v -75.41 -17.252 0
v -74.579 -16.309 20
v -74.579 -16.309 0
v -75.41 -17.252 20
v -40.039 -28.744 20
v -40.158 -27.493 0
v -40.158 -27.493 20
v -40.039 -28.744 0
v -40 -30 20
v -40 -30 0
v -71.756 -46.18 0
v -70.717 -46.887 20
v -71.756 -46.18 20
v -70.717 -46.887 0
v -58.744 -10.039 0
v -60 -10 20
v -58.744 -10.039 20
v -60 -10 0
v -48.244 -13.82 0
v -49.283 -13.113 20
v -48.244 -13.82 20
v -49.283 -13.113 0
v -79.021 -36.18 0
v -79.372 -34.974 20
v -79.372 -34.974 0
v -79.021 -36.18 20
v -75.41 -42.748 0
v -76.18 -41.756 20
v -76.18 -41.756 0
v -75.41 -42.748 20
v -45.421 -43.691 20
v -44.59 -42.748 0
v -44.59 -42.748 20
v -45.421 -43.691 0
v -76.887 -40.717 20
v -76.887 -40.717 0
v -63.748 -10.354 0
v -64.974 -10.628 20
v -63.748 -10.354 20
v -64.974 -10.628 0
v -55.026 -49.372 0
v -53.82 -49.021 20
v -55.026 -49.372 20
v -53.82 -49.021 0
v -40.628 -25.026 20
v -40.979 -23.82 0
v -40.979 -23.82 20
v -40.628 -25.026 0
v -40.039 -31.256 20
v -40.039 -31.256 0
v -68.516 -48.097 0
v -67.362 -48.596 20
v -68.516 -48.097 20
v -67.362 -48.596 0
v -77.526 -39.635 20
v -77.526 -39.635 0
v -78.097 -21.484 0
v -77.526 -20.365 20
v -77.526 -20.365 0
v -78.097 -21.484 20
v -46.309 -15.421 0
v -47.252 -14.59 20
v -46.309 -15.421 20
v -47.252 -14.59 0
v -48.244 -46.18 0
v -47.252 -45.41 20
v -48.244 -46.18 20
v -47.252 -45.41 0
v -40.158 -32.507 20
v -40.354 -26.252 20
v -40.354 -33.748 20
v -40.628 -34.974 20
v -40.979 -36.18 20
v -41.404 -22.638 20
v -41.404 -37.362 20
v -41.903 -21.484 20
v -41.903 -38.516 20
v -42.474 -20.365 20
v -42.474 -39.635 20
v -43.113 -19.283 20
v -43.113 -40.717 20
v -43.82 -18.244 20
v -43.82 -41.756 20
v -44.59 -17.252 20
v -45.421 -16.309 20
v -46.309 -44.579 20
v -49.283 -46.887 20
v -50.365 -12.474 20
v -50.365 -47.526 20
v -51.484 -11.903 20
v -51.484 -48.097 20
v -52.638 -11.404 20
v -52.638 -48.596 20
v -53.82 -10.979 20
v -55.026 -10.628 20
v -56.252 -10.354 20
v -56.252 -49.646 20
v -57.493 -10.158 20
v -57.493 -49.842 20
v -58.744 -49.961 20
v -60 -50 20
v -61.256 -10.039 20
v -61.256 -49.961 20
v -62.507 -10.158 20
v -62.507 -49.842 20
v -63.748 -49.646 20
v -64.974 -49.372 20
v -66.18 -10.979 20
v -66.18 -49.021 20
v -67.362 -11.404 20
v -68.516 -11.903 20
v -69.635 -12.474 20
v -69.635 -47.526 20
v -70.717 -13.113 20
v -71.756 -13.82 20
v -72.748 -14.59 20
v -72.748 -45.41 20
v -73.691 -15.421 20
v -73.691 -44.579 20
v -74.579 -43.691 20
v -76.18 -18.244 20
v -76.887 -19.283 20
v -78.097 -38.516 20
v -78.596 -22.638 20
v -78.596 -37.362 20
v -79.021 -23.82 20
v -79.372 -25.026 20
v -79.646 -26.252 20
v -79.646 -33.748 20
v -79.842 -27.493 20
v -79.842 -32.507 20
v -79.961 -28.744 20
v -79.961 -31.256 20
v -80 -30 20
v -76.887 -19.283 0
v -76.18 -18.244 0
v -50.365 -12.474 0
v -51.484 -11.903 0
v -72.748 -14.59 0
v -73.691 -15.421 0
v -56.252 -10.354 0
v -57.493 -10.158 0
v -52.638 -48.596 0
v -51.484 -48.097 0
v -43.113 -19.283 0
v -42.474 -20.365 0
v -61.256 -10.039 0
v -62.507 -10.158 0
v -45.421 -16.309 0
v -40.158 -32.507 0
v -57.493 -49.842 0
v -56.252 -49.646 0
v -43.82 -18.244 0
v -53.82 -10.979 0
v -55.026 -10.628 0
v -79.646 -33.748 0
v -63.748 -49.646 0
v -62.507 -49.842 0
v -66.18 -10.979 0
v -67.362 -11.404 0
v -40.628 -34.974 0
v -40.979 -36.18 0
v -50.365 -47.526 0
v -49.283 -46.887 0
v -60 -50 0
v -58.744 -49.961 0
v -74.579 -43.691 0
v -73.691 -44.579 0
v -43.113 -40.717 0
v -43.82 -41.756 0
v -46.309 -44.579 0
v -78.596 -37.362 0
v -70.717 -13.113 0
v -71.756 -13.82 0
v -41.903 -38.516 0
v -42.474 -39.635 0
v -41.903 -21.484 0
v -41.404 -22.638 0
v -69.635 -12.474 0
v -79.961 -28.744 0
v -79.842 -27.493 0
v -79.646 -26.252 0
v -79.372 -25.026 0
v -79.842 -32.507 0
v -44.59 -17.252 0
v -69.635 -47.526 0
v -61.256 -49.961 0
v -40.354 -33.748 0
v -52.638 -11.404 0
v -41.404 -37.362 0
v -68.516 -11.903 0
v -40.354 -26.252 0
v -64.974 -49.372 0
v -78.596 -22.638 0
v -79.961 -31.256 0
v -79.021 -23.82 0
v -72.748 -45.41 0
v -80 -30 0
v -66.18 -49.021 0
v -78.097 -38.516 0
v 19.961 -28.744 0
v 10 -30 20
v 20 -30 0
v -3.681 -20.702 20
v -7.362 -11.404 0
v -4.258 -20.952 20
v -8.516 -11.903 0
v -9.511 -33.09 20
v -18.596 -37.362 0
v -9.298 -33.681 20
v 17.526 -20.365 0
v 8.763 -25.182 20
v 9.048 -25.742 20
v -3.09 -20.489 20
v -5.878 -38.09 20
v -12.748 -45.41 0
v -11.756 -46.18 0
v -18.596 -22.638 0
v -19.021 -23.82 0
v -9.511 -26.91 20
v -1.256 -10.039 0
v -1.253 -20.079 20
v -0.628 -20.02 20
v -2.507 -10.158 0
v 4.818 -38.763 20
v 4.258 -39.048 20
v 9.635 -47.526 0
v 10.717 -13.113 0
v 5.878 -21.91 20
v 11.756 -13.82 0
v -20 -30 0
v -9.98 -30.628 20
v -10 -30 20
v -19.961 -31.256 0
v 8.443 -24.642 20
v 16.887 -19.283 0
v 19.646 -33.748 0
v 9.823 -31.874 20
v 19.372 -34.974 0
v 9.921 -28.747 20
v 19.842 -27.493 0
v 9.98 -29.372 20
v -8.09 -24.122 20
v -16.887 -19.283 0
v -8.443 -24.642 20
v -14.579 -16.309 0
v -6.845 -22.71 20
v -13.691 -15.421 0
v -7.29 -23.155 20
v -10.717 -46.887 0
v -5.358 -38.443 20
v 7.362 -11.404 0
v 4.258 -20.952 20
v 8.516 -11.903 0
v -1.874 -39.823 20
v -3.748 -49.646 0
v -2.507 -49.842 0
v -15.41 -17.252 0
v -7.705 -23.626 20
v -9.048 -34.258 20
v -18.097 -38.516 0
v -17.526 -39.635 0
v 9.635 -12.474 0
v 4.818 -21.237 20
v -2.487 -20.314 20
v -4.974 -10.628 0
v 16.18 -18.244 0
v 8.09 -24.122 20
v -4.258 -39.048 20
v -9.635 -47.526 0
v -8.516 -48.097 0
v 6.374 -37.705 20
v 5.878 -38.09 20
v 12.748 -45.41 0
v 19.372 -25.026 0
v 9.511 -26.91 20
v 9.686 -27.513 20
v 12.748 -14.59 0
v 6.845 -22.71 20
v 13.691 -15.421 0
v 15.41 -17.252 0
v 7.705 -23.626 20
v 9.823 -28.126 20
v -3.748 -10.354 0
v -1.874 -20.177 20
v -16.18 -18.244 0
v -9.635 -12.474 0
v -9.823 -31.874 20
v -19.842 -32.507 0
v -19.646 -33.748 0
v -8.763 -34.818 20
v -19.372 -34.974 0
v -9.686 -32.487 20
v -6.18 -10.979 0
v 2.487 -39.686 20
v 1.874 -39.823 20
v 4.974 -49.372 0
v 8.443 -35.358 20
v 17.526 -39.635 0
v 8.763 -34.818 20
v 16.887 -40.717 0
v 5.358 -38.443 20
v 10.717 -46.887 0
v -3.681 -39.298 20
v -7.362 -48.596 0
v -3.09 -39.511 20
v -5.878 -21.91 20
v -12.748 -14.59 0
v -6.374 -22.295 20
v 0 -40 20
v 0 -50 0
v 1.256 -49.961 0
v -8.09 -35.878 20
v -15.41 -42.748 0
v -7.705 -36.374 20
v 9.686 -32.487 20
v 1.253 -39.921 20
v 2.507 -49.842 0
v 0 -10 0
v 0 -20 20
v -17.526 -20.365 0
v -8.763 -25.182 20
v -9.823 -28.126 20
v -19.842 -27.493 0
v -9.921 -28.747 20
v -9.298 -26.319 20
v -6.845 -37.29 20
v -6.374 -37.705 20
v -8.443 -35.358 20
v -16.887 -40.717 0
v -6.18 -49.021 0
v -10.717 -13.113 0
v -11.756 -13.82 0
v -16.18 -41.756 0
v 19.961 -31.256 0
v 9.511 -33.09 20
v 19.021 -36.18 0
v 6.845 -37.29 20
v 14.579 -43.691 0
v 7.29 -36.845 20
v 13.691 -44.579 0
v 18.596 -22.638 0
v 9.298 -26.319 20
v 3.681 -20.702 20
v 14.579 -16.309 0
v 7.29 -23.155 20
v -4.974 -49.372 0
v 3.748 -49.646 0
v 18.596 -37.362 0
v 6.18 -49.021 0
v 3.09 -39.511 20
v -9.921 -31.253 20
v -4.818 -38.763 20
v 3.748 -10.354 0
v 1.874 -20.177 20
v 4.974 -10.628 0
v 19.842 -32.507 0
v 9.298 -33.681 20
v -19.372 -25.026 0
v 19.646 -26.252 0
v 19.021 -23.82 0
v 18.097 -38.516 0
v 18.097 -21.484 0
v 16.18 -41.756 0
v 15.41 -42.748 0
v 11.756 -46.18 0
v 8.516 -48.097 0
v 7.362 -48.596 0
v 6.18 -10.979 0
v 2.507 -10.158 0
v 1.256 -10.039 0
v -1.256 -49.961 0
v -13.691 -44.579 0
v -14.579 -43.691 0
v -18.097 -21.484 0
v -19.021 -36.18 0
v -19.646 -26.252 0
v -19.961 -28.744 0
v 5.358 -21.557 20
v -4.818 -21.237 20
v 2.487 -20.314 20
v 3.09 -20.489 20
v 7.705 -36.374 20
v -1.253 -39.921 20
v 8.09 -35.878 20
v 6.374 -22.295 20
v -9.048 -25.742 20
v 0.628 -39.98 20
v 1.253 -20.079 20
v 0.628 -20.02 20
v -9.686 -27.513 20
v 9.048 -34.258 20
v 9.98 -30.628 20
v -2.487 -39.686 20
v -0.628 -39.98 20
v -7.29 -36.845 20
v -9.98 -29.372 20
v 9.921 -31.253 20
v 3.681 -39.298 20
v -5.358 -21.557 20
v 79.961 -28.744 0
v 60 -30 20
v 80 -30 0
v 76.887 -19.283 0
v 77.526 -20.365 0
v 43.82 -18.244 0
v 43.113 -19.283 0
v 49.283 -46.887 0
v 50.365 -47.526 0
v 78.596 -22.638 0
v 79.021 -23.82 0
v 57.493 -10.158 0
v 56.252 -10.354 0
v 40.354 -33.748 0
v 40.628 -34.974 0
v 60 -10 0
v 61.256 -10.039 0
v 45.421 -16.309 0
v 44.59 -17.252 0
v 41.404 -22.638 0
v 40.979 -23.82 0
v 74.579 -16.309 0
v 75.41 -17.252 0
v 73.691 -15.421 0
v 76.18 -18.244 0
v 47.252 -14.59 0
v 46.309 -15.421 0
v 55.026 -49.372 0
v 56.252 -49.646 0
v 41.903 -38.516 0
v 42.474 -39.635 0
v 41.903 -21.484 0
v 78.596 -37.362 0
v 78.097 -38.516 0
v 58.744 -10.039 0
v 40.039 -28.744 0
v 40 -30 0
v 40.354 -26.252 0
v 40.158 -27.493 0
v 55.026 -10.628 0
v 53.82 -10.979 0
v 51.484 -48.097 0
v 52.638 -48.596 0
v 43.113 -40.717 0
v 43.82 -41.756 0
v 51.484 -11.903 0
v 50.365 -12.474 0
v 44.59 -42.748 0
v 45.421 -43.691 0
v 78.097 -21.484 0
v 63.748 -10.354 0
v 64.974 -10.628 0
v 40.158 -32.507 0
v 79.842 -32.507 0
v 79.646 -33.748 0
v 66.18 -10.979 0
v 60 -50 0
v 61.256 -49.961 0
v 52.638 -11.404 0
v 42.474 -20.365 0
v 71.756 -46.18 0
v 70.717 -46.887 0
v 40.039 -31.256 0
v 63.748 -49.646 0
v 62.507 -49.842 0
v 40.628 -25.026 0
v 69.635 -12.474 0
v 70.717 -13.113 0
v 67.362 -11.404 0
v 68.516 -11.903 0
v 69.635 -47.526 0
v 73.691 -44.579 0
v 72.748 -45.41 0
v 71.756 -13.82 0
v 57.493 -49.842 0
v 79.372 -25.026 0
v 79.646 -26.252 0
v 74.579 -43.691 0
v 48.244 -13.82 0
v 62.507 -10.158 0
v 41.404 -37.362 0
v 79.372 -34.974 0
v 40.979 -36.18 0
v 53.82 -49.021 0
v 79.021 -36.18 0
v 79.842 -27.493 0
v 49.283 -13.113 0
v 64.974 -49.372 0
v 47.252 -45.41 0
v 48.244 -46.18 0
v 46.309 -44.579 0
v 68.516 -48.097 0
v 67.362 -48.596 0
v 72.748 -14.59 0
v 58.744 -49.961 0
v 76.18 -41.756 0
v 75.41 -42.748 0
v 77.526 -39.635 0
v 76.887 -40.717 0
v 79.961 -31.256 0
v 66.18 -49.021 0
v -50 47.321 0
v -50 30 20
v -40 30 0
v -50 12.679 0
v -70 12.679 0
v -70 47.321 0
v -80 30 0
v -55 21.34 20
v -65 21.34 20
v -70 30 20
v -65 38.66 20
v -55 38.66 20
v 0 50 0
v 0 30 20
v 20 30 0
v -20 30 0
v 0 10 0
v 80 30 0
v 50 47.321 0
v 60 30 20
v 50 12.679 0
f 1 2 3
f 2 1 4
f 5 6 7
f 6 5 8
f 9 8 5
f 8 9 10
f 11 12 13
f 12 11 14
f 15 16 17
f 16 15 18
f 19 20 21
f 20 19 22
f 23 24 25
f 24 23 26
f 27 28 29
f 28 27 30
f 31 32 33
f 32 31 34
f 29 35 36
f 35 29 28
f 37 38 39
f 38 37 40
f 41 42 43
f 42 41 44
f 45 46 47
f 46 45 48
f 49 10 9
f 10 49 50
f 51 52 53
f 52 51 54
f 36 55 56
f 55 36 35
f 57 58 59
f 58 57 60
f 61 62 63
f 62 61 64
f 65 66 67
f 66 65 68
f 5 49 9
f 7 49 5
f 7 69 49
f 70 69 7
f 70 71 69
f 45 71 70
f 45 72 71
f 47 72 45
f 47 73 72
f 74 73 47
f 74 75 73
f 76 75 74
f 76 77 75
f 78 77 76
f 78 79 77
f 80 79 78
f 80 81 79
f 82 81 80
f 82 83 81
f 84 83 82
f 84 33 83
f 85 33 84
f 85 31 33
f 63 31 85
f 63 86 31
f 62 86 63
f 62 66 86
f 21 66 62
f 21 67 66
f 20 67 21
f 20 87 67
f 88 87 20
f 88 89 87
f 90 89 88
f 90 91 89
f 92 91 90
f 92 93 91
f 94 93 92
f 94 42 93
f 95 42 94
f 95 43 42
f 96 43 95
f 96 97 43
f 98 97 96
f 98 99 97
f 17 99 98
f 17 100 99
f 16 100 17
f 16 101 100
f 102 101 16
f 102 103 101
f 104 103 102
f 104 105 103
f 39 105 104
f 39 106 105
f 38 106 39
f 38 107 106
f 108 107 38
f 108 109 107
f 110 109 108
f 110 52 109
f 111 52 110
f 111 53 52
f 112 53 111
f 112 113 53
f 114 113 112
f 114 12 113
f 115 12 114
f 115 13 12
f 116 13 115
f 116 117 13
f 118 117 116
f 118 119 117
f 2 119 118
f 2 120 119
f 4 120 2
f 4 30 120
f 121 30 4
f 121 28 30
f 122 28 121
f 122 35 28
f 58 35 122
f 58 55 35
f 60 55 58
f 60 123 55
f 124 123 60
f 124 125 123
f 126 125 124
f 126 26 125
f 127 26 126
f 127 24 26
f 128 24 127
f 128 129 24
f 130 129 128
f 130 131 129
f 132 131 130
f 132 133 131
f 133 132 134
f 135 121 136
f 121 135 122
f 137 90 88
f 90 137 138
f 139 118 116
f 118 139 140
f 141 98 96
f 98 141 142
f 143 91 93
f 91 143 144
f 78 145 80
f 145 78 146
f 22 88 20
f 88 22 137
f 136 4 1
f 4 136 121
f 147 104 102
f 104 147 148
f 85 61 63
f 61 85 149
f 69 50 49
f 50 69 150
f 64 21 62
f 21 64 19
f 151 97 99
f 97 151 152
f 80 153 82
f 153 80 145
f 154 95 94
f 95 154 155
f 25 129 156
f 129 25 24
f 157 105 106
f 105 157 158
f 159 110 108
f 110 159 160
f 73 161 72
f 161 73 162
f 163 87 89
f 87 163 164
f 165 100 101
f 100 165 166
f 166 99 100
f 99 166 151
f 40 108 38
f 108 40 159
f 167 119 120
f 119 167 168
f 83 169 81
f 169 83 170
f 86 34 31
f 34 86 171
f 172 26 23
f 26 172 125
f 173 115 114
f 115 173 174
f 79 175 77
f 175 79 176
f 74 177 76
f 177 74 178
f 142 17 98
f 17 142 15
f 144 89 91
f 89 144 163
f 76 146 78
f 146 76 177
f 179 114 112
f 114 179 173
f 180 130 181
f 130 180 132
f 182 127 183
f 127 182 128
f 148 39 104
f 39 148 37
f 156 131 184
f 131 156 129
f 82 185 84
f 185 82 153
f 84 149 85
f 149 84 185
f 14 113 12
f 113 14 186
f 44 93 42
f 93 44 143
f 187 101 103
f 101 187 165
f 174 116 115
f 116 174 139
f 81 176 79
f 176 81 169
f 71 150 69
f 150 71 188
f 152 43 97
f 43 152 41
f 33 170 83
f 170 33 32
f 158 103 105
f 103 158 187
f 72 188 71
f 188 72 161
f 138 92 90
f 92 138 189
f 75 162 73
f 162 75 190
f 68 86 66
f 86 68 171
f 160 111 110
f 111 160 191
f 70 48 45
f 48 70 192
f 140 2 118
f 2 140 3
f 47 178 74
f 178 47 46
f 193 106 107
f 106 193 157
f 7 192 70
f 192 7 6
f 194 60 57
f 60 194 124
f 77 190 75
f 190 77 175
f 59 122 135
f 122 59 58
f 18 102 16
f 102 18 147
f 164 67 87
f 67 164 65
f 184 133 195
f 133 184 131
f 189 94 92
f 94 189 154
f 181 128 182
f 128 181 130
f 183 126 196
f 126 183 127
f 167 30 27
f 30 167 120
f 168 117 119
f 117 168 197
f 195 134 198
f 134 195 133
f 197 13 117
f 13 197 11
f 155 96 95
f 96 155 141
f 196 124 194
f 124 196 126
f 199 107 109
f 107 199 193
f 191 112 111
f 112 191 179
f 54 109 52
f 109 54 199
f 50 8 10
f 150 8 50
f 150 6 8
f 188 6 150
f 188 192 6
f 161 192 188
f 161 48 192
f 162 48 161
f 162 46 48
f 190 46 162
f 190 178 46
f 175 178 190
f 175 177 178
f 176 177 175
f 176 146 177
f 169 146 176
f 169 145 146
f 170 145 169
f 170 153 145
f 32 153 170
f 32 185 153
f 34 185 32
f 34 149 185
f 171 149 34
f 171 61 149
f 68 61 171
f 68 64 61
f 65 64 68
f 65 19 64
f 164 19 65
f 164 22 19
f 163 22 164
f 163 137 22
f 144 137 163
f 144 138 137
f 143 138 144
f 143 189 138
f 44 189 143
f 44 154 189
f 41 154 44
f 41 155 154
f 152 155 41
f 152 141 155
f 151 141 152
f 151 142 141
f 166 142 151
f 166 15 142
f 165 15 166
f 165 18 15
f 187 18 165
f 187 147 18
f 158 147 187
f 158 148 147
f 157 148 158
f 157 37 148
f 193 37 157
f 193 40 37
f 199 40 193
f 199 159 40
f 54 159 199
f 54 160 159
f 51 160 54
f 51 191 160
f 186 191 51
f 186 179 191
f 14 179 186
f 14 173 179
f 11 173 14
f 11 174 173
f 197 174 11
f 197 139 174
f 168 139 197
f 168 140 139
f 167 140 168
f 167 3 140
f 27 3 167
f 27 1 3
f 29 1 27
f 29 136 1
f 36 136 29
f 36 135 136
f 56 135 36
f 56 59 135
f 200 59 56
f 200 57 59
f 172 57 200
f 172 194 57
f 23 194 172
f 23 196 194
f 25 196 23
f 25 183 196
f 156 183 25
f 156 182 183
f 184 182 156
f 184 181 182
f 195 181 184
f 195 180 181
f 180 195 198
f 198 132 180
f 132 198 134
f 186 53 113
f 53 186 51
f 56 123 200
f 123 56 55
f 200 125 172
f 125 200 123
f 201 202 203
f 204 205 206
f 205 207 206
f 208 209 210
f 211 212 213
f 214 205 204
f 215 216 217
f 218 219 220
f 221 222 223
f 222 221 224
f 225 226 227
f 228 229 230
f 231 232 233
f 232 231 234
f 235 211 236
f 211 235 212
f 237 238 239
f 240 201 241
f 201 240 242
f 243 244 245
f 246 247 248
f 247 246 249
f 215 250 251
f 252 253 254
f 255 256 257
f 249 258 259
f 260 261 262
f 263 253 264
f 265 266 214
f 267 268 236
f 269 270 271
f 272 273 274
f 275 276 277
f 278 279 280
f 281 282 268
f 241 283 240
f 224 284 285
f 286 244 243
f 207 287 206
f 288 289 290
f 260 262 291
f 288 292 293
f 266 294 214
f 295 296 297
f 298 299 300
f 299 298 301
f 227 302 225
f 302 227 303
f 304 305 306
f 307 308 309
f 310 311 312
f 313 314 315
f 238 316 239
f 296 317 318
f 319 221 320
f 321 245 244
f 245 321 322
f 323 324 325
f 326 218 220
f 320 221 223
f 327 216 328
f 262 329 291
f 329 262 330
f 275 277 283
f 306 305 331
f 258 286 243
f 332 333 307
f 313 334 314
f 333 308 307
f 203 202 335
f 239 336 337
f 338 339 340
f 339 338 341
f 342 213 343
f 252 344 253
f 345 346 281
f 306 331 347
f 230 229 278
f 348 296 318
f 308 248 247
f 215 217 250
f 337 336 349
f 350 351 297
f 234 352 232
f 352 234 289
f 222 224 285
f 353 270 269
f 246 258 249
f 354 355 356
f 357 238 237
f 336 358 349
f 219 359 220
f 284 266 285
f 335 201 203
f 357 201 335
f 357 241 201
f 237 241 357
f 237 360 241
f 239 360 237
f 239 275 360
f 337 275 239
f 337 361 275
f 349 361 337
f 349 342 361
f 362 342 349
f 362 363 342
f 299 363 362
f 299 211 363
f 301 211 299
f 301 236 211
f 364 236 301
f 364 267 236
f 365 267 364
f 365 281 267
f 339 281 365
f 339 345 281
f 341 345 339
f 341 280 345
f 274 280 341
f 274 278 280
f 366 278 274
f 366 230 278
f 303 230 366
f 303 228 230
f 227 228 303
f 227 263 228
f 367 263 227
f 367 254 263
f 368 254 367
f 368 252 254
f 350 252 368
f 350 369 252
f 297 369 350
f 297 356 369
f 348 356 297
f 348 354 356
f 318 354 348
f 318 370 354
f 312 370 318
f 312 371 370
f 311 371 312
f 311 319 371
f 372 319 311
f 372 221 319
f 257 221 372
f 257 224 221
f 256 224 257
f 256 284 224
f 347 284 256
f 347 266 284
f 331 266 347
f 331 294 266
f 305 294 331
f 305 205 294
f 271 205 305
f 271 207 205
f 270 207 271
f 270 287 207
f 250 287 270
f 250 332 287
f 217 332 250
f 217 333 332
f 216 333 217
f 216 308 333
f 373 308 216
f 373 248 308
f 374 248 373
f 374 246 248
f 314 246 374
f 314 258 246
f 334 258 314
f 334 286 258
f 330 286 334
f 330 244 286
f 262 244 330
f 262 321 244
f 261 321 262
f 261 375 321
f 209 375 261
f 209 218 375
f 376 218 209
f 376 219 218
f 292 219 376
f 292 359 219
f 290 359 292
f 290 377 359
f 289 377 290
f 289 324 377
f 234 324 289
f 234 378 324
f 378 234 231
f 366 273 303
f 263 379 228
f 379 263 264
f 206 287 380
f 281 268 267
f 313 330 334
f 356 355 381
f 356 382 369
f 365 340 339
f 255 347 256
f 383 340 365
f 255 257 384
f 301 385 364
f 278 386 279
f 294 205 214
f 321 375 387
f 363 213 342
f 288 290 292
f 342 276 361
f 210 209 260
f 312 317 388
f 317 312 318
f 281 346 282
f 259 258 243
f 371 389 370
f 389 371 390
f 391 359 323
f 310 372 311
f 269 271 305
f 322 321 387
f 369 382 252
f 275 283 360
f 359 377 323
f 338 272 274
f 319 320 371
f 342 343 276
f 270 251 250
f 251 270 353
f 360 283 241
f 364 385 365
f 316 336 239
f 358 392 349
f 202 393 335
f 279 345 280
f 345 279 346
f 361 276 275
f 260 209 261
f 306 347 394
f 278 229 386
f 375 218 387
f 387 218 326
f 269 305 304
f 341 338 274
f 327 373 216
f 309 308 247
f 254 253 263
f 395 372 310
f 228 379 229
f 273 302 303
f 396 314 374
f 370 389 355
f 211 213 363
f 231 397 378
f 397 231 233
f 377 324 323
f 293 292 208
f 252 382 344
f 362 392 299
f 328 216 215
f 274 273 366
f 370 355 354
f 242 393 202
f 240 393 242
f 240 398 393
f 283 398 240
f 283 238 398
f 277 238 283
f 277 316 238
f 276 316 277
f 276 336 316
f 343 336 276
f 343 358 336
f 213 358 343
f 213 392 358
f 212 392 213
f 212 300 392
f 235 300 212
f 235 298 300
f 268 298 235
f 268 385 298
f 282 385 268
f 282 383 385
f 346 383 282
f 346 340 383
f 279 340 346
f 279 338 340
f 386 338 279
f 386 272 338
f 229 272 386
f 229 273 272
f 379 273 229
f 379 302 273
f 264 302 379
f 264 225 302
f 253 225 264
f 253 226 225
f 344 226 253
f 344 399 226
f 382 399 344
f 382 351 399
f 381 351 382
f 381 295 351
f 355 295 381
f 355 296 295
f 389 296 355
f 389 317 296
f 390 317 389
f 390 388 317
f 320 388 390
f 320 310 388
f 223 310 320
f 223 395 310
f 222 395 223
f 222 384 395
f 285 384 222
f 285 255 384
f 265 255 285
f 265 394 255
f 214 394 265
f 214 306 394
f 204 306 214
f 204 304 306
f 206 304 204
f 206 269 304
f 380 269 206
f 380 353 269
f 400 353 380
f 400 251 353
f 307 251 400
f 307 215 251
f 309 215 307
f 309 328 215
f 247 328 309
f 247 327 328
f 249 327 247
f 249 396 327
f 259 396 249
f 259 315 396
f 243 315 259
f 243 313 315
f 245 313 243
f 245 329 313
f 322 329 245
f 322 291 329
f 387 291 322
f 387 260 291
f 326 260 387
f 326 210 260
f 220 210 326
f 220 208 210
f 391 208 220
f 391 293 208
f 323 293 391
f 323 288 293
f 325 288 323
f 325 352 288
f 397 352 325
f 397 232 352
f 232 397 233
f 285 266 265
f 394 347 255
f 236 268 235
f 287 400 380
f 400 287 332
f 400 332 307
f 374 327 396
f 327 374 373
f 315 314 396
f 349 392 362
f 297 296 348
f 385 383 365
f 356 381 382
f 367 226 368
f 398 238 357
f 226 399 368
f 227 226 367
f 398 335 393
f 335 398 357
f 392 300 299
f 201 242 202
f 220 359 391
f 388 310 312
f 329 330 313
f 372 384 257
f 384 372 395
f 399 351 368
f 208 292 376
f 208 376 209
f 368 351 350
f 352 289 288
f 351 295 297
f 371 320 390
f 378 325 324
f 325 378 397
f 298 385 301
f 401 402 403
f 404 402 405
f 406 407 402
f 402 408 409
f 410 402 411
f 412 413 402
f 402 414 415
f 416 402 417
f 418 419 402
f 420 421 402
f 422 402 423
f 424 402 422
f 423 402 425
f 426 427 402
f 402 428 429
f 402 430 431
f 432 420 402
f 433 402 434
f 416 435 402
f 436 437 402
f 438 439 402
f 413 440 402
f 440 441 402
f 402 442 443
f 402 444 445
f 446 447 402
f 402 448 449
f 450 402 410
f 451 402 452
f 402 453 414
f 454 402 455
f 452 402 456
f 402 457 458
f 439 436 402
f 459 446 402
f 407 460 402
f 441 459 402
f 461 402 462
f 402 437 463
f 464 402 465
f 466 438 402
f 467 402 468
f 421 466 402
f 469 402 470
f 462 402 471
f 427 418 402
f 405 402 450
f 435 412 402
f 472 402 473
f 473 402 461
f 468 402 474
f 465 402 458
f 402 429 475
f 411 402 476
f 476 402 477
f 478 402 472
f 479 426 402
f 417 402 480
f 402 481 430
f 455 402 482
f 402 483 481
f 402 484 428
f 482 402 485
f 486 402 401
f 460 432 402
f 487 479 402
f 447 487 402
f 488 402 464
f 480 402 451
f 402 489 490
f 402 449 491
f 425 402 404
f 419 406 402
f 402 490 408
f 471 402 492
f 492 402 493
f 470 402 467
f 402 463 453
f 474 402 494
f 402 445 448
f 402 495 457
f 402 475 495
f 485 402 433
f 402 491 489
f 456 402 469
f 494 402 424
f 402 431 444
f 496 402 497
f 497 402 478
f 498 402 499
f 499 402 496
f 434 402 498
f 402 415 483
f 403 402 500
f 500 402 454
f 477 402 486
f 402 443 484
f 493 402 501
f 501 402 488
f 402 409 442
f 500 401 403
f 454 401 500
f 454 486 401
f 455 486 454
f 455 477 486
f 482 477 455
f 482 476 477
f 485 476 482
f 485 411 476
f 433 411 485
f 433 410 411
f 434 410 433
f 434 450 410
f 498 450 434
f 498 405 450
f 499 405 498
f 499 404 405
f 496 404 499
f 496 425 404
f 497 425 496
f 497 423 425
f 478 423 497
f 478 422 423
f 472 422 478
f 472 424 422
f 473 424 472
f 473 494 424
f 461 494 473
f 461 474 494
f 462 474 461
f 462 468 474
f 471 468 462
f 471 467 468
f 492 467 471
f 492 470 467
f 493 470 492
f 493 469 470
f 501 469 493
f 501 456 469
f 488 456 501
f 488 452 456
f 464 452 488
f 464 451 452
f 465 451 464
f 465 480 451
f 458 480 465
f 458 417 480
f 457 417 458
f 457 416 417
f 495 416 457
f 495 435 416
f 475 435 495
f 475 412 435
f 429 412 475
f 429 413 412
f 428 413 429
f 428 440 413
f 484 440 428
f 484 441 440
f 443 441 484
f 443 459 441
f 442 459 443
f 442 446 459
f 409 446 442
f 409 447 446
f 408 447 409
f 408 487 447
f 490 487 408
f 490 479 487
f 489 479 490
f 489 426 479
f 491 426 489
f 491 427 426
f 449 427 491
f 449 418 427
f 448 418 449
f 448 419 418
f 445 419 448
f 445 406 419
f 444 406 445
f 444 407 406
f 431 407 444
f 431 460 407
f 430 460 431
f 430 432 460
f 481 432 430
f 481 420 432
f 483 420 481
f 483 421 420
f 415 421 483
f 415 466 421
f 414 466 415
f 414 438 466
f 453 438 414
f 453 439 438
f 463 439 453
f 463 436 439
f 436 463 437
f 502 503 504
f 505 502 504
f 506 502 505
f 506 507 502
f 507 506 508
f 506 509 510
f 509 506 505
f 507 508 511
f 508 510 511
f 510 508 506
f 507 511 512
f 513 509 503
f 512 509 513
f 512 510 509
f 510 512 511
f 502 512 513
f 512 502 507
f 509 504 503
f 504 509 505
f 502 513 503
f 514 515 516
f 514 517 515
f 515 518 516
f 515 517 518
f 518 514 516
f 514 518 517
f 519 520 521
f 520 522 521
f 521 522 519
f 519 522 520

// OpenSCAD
//-- Dimensiones de los cuadros de la cuadricula
d = 60;

//-- Centrar la cuadricula (opcional)
translate([-2*d / 2, -d / 2, 0]) {

  //-- Cuadricula: 0, 0
  translate([0, 0, 0]) cylinder (r = 20, h = 20, $fn = 100);

  //-- cuadricula: 1, 0
  translate([d, 0, 0]) cylinder (r1 = 20, r2 = 10, h = 20, $fn = 100);

  //-- Cuadricula: 2, 0
  translate([2*d, 0, 0]) cylinder (r1 = 20, r2 = 0, h = 20, $fn = 100);

  //-- Cuadridula: 0, 1
  translate([0, d, 0])  cylinder (r1 = 20, r2 = 10, h = 20, $fn = 6);

  //-- Cuadricula: 1, 1
  translate([d, d, 0])  cylinder (r1 = 20, r2 = 0, h = 20, $fn = 4);

  //-- Cuadricula: 2, 1
  translate([2*d, d, 0]) cylinder (r1 = 20, r2 = 0, h = 20, $fn = 3);

}
